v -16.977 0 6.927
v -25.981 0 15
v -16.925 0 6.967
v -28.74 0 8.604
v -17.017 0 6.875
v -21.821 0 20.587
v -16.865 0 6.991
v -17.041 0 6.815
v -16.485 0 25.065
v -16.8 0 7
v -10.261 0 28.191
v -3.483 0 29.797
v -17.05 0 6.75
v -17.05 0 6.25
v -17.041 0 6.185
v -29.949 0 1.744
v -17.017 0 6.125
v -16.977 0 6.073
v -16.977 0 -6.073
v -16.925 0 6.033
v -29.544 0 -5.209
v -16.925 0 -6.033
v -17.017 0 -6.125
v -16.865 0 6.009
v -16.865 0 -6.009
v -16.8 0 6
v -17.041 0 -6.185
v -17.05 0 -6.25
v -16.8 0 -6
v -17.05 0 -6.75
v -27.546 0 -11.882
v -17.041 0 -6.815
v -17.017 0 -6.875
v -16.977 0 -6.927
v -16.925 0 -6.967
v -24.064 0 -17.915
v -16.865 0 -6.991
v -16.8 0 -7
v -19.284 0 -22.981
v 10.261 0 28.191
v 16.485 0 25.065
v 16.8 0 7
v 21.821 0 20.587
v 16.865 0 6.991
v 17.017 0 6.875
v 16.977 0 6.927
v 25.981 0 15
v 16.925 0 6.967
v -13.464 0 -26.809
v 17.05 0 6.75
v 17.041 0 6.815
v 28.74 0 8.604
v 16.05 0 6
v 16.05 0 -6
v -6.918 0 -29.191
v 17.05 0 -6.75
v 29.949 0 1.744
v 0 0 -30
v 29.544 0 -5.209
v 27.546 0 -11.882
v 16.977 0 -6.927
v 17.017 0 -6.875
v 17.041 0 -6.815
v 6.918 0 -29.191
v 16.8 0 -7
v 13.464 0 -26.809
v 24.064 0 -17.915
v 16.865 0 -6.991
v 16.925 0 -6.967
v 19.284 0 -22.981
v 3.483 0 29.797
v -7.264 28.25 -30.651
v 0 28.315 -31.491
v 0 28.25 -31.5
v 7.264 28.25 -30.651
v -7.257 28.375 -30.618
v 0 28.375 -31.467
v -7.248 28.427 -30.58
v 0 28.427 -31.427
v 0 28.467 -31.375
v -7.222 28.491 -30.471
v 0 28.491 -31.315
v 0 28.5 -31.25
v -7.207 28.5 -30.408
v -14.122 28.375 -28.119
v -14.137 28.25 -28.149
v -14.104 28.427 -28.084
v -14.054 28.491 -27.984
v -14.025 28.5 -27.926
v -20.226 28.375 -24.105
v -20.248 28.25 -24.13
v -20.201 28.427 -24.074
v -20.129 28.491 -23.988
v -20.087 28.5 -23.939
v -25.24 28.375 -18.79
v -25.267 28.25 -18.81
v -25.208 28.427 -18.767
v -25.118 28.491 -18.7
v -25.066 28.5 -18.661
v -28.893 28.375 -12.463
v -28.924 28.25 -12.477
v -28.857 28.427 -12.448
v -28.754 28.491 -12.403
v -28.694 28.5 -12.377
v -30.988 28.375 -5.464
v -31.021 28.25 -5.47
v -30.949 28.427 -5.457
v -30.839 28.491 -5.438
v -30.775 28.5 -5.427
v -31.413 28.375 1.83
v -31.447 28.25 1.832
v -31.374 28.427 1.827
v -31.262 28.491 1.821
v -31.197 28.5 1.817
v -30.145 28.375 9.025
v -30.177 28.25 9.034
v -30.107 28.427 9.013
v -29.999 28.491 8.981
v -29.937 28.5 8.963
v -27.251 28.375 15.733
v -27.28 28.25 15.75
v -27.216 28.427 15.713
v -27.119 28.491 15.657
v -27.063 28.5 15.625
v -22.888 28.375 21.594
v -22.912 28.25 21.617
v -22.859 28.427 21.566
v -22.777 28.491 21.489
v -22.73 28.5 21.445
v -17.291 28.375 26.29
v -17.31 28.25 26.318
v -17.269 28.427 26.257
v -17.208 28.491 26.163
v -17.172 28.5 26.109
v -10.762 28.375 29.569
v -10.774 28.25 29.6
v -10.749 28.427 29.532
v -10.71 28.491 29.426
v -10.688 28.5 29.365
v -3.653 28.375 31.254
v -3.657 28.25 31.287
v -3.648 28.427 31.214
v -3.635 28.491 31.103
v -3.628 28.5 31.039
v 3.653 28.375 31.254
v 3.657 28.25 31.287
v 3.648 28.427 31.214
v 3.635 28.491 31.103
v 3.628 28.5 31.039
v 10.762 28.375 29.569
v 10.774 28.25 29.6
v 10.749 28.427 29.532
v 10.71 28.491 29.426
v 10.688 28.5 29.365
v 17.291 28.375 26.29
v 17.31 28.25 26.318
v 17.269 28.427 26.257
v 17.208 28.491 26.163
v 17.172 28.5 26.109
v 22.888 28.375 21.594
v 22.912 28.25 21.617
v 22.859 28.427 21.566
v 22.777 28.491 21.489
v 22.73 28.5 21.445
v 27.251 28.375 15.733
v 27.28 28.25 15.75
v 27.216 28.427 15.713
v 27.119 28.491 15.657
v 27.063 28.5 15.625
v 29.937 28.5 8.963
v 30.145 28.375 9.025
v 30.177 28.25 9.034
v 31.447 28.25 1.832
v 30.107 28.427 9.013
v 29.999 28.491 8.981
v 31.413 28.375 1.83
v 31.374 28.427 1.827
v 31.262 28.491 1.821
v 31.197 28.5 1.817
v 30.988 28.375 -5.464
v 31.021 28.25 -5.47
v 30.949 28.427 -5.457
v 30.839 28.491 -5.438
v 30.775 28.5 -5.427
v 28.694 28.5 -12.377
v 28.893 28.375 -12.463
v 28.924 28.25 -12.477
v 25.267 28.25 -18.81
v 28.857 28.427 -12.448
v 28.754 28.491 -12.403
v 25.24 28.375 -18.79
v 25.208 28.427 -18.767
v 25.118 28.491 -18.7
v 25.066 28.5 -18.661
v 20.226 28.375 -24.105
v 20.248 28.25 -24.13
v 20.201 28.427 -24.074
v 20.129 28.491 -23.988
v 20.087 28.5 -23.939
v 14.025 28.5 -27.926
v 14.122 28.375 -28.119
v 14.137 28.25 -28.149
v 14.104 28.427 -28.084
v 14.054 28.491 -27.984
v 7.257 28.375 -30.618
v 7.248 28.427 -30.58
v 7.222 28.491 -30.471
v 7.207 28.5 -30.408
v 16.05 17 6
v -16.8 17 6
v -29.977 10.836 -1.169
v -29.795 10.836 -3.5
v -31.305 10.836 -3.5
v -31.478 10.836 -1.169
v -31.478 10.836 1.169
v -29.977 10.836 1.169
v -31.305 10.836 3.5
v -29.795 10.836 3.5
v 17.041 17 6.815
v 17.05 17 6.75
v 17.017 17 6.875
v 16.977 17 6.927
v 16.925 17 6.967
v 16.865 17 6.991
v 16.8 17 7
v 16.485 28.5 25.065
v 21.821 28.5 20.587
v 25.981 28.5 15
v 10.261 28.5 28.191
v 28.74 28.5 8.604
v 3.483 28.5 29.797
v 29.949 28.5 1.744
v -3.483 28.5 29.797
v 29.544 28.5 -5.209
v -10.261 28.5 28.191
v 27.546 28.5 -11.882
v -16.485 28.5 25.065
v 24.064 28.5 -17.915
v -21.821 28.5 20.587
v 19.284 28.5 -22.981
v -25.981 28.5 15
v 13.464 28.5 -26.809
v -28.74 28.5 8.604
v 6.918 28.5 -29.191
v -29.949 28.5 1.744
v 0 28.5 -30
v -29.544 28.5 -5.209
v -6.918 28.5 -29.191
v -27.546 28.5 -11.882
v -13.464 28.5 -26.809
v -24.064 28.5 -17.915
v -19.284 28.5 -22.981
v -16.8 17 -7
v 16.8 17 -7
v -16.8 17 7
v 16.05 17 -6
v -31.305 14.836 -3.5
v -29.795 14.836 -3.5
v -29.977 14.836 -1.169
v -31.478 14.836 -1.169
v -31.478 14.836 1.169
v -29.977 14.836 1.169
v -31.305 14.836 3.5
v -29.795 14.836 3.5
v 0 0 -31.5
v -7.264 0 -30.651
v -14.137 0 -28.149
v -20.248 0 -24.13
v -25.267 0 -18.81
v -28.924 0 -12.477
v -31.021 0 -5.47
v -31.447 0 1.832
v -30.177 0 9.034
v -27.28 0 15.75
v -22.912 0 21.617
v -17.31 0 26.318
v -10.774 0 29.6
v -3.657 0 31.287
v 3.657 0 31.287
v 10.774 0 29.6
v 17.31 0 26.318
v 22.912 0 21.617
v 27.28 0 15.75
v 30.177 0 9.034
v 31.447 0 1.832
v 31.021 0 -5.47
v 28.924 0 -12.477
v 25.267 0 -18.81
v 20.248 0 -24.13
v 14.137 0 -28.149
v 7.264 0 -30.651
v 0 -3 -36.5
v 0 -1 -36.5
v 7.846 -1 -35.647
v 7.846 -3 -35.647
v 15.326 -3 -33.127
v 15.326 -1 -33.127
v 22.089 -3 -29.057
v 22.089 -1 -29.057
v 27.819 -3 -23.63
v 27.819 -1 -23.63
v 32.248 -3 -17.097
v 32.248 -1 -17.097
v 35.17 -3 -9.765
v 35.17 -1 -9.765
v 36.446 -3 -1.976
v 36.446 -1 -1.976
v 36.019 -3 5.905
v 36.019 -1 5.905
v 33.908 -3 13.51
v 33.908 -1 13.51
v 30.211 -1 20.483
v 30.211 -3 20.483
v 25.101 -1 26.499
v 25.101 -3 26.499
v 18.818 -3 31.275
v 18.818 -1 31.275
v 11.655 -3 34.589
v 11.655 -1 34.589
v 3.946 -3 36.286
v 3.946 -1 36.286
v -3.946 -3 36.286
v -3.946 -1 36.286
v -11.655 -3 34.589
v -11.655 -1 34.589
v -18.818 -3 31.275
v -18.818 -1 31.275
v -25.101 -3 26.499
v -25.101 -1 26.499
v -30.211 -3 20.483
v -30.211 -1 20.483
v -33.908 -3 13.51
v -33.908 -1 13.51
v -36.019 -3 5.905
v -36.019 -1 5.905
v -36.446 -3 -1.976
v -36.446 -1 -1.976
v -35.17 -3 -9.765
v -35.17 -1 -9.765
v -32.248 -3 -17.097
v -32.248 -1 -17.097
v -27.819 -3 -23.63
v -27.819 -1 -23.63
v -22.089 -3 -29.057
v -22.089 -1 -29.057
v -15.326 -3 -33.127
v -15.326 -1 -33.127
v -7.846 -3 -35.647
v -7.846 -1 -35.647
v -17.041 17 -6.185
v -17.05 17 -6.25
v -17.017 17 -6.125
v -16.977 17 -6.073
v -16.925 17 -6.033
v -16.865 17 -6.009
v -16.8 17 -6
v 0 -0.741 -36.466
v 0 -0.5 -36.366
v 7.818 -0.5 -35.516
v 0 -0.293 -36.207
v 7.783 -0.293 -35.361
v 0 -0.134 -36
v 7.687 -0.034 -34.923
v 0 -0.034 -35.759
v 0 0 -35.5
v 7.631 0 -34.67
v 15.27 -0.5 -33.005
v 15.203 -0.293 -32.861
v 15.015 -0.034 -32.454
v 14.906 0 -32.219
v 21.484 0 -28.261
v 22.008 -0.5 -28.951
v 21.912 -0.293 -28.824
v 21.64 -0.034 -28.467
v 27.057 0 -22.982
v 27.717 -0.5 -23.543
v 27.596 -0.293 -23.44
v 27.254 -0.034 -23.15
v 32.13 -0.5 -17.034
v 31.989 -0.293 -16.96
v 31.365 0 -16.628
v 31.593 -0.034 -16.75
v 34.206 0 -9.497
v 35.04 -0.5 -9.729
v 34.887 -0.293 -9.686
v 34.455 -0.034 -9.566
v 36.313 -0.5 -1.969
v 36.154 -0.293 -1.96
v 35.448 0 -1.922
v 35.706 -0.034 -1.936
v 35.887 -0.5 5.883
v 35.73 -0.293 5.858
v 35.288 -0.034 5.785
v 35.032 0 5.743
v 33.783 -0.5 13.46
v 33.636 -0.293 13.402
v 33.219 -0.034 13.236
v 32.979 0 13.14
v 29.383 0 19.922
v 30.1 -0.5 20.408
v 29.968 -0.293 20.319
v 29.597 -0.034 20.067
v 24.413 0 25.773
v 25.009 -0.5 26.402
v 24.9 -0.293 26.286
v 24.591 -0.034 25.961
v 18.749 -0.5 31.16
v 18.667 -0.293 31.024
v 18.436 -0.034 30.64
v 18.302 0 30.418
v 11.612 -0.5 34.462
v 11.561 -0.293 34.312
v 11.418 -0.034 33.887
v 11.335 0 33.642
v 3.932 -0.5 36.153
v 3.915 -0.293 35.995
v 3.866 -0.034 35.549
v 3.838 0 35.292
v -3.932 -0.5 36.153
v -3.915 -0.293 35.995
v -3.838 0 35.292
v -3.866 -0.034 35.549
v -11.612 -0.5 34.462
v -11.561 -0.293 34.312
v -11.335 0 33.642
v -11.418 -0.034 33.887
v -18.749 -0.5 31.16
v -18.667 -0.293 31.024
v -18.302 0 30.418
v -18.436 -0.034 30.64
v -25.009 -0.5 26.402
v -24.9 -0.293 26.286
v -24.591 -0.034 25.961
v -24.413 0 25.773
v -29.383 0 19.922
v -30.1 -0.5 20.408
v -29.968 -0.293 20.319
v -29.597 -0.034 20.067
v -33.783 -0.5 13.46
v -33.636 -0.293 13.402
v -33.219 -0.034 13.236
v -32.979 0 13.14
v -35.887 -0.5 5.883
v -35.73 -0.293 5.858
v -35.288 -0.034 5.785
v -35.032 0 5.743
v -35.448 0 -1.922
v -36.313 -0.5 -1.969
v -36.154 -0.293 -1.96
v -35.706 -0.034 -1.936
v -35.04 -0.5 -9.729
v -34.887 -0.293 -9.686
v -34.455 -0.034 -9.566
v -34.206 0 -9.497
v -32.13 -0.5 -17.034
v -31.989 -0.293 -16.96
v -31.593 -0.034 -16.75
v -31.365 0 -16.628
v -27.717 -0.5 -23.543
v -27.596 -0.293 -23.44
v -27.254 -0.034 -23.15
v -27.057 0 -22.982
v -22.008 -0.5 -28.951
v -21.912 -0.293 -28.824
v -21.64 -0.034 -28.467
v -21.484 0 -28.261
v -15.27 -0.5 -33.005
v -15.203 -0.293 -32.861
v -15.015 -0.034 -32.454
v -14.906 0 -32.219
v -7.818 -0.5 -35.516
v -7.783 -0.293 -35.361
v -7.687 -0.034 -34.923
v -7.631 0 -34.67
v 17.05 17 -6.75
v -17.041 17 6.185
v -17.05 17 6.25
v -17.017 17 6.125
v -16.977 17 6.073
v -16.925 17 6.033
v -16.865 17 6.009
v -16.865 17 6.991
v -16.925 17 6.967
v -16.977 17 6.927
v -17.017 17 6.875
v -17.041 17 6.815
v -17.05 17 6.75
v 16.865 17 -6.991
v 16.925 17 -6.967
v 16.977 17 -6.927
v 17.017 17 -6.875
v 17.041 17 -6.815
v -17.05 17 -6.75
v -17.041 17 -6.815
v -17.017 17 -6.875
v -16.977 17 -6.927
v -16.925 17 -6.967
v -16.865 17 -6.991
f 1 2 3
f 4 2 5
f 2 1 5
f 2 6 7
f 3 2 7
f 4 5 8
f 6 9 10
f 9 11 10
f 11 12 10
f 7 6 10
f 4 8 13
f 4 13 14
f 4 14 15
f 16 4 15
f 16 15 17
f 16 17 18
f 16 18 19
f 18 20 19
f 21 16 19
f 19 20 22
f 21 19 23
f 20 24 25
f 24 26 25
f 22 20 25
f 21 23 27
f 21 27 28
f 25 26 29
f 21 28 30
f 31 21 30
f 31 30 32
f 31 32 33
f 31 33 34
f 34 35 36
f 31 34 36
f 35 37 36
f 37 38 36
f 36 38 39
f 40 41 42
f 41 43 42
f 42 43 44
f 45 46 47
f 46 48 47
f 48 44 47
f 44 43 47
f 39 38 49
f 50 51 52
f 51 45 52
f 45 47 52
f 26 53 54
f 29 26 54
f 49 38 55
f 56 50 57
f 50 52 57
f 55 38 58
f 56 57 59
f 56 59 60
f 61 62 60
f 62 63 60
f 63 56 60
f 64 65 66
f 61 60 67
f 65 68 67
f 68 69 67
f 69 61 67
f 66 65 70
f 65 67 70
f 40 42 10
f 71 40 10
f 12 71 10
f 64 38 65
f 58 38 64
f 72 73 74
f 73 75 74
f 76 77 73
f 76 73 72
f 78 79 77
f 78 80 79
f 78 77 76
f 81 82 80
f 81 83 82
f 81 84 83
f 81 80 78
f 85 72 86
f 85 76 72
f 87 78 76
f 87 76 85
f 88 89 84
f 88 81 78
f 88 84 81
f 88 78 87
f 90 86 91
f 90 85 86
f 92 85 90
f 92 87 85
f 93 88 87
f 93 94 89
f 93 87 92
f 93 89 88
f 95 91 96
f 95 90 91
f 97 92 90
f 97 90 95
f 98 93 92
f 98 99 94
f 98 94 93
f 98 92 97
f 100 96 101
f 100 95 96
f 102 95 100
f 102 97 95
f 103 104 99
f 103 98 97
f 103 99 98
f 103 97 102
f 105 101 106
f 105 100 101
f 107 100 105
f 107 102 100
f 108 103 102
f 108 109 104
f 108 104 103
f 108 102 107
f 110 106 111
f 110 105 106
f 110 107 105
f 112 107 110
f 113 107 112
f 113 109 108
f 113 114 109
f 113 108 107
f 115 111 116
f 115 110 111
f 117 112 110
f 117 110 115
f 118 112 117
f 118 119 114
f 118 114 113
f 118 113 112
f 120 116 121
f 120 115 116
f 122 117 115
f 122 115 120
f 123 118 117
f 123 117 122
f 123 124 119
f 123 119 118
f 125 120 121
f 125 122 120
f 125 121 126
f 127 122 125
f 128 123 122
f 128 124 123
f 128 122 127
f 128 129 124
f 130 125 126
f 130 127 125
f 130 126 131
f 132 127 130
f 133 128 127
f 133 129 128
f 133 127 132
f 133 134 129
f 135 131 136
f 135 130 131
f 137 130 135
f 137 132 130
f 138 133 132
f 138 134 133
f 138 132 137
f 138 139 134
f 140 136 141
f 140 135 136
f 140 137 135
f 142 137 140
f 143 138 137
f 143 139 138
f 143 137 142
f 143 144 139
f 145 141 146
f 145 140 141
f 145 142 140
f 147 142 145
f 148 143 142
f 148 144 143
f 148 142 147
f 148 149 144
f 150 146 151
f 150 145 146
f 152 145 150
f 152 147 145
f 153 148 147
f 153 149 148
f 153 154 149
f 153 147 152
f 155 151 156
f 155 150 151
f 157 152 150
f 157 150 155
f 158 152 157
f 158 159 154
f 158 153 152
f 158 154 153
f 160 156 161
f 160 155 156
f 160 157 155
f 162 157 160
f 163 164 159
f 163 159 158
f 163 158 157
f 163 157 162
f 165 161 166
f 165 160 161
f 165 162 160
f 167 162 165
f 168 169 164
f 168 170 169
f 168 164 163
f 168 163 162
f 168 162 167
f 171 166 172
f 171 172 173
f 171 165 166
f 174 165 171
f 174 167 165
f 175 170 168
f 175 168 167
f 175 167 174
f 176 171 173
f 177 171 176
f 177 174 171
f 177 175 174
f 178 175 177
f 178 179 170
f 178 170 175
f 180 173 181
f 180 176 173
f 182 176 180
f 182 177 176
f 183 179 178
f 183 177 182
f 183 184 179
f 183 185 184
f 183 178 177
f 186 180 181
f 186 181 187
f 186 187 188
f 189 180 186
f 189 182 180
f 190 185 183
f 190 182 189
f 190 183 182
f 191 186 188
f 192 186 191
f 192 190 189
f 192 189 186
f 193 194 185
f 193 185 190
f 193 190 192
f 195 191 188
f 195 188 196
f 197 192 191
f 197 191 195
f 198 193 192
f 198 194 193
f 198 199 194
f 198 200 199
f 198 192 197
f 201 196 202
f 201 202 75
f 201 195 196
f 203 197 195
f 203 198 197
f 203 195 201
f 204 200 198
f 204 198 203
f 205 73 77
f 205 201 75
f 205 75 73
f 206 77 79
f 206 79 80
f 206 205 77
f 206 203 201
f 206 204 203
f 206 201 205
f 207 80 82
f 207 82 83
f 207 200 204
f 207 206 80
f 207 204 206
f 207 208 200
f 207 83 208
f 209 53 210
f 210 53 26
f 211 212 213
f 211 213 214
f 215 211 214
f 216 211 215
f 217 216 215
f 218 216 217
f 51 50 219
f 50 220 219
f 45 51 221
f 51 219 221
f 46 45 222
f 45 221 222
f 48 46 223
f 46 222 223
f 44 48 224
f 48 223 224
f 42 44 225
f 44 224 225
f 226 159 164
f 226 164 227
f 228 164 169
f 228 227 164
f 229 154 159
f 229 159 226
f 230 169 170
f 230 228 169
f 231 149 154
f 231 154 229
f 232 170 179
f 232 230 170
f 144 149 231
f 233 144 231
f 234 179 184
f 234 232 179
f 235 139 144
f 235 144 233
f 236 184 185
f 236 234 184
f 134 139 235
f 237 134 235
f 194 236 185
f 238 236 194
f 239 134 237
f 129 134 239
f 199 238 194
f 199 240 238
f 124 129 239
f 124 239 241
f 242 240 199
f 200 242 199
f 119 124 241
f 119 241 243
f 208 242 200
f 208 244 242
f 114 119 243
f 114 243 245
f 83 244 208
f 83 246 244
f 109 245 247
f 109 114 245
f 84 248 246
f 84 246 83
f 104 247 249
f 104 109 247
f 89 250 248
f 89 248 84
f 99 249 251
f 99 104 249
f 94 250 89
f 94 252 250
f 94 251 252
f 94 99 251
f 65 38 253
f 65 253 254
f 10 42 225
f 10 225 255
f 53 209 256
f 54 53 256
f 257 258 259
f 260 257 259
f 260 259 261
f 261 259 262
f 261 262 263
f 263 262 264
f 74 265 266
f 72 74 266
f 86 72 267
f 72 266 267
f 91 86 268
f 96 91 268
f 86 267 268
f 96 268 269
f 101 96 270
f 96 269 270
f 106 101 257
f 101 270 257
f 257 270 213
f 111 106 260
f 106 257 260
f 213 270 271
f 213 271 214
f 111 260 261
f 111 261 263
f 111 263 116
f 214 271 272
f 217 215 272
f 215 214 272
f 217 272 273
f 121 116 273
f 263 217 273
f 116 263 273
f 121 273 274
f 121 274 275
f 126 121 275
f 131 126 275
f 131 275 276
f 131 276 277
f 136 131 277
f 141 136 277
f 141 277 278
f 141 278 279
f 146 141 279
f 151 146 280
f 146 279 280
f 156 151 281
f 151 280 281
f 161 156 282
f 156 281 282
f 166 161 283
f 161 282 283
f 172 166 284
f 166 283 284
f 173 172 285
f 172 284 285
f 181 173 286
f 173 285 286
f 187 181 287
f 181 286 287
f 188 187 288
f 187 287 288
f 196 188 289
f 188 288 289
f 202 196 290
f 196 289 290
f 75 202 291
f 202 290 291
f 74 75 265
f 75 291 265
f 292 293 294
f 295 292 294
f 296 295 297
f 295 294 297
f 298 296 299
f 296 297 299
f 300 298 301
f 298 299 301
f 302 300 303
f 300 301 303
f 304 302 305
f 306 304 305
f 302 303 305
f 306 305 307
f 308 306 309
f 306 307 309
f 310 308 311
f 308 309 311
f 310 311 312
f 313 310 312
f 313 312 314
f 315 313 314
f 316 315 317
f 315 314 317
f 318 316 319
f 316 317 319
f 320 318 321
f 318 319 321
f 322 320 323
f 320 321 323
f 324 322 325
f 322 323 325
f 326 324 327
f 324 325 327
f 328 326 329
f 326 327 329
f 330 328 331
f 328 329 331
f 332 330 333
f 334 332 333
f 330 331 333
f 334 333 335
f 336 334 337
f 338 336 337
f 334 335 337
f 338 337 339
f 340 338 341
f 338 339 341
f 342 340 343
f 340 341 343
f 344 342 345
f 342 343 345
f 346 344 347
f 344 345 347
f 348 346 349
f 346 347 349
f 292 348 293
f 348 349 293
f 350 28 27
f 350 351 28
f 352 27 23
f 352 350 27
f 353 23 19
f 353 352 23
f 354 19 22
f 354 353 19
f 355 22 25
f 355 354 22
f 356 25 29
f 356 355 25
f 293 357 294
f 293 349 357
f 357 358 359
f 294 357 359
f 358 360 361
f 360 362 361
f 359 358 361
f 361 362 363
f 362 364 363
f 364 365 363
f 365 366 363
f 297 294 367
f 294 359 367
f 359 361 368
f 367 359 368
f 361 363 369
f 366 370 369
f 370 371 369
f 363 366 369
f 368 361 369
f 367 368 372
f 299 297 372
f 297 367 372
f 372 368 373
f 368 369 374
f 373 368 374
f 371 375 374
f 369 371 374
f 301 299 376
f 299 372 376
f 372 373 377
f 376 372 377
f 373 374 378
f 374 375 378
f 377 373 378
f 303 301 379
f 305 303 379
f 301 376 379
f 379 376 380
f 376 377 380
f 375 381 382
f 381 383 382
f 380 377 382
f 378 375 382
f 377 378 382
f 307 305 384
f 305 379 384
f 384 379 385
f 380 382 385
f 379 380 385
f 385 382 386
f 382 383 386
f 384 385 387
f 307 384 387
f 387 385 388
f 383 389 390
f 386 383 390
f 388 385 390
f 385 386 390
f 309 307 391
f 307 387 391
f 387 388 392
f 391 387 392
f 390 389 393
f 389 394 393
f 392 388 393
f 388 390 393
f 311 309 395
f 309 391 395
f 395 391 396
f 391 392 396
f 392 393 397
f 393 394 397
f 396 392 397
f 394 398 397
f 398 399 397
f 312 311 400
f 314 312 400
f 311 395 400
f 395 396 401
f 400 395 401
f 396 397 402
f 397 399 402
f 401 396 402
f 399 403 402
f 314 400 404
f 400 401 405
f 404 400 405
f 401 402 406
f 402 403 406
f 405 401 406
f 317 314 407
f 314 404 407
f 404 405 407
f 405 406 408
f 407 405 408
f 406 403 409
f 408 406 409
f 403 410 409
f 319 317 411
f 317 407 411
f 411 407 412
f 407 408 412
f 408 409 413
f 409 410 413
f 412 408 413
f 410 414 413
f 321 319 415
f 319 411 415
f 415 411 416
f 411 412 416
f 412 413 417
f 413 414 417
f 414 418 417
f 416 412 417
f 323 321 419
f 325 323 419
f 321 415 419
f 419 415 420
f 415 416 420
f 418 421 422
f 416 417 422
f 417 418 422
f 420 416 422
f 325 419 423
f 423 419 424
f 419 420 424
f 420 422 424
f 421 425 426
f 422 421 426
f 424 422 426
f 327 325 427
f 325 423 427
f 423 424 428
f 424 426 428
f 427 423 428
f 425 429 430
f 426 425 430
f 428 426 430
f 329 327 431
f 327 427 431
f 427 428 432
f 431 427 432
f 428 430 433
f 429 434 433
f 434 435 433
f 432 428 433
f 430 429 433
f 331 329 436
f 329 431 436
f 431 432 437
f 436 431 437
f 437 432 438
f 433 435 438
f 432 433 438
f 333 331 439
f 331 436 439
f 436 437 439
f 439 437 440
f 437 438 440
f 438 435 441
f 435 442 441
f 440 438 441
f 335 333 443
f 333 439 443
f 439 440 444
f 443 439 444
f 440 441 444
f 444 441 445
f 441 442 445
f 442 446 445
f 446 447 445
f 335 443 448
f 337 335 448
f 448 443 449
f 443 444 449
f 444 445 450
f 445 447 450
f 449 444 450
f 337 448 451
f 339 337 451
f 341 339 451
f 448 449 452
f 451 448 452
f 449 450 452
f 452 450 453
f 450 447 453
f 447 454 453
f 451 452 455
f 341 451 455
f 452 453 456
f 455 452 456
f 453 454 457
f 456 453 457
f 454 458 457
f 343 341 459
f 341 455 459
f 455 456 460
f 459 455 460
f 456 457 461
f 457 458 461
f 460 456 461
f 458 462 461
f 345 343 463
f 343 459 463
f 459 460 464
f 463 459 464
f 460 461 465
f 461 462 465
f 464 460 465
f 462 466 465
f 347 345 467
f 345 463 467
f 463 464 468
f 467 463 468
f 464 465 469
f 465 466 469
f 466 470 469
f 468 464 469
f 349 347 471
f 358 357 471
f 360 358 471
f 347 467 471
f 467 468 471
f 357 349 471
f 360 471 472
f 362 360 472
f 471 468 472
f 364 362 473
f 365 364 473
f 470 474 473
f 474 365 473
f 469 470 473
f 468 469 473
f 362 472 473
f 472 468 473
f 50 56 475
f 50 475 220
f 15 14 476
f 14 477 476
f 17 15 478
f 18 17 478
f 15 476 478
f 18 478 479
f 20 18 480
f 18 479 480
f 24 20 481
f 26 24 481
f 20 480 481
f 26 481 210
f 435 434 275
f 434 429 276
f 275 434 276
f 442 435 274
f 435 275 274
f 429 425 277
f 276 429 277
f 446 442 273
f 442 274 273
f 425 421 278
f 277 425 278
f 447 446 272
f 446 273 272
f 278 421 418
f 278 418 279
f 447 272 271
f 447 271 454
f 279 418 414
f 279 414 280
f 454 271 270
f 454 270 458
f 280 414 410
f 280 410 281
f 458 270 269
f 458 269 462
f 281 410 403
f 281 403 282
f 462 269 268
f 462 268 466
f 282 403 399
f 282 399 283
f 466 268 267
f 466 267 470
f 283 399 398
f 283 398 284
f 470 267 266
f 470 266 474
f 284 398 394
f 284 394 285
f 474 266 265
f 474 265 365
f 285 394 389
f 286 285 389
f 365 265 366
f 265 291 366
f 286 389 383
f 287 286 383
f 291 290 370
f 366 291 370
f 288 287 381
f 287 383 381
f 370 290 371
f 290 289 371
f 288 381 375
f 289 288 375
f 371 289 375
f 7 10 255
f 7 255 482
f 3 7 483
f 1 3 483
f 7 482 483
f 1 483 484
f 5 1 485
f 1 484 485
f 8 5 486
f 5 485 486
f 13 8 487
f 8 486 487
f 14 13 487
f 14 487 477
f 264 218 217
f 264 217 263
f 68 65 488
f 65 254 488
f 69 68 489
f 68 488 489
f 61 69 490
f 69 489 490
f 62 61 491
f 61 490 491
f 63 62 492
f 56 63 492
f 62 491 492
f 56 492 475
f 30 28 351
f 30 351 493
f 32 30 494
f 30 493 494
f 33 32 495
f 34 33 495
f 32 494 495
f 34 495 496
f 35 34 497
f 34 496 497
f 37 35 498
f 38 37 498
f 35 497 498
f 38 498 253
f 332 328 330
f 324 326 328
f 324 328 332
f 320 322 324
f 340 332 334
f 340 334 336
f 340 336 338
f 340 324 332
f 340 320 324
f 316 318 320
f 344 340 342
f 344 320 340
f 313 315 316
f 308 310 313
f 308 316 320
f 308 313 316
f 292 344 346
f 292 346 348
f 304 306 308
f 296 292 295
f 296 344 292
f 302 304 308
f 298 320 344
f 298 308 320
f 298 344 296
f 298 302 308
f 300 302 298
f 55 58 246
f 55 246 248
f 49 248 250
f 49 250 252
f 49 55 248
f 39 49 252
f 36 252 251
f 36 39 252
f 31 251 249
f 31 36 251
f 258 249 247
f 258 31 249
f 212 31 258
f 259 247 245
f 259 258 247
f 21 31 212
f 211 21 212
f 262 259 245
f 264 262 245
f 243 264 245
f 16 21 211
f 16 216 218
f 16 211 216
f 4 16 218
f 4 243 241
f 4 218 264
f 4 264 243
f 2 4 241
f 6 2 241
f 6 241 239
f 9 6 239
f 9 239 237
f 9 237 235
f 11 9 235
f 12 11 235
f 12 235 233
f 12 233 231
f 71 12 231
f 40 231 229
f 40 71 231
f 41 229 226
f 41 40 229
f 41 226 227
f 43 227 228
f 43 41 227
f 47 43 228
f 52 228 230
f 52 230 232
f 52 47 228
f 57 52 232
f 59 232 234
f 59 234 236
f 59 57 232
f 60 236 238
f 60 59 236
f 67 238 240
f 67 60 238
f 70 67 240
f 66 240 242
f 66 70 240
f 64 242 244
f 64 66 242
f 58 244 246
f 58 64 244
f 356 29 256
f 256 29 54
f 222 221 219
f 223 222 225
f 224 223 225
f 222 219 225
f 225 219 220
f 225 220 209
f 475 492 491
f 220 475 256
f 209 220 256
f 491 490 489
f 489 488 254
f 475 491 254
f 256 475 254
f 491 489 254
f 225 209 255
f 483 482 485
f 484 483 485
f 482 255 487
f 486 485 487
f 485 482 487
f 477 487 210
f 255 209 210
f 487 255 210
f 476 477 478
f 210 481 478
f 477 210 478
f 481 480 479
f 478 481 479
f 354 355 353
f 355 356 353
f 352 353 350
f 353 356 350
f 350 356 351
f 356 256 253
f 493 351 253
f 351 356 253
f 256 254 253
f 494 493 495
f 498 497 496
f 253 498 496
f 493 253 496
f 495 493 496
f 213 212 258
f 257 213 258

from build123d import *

# Parameters (mm, degrees)
SKETCH1_R           = 31.5
SKETCH1_R_2         = 30
BOSS_EXTRUDE1_DEPTH = 28.5
SKETCH2_R           = 36.5
BOSS_EXTRUDE2_DEPTH = 3
BOSS_EXTRUDE3_DEPTH = 17
SKETCH4_W           = 7
SKETCH4_H           = 4
CUT_EXTRUDE1_DEPTH  = 71.042861878
FILLET1_R           = 1
FILLET2_R           = 0.25
FILLET3_R           = 0.25


with BuildPart() as part:
    # Sketch1 → Boss-Extrude1 (new body)
    with BuildSketch(Plane(origin=(0, 0, 0), x_dir=(1, 0, 0), z_dir=(0, 1, 0))):
        with Locations(Location((0, 0, 0), (0, 0, 90))):
            Circle(SKETCH1_R)
        with Locations(Location((0, 0, 0), (0, 0, 90))):
            Circle(SKETCH1_R_2, mode=Mode.SUBTRACT)
    extrude(amount=BOSS_EXTRUDE1_DEPTH)

    # Sketch2 → Boss-Extrude2 (add)
    with BuildSketch(Plane.XZ):
        with Locations(Location((0, 0, 0), (0, 0, 270))):
            Circle(SKETCH2_R)
    extrude(amount=BOSS_EXTRUDE2_DEPTH)

    # Sketch3 → Boss-Extrude3 (add)
    with BuildSketch(Plane(origin=(0, 0, 0), x_dir=(1, 0, 0), z_dir=(0, 1, 0))):
        Polygon((-16.05, 6), (-17.05, 6), (-17.05, 7), (17.05, 7), (17.05, -7), (-17.05, -7), (-17.05, -6), (-16.05, -6), (16.05, -6), (16.05, 6), align=None)
    extrude(amount=BOSS_EXTRUDE3_DEPTH)

    # Sketch4 → Cut-Extrude1 (cut, through all)
    with BuildSketch(Plane.ZY.offset(-16.05)):
        with Locations((0, 12.835709784)):
            Rectangle(SKETCH4_W, SKETCH4_H)
    extrude(amount=CUT_EXTRUDE1_DEPTH, mode=Mode.SUBTRACT)

    # Fillet1
    fillet1_edges = [part.edges().sort_by_distance(p)[0] for p in [
        (0, 0, 36.5),
    ]]
    fillet(fillet1_edges, radius=FILLET1_R)

    # Fillet2
    fillet2_edges = [part.edges().sort_by_distance(p)[0] for p in [
        (0, 28.5, 31.5),
    ]]
    fillet(fillet2_edges, radius=FILLET2_R)

    # Fillet3
    fillet3_edges = [part.edges().sort_by_distance(p)[0] for p in [
        (-17.05, 8.5, 6),
        (-17.05, 8.5, 7),
        (17.05, 8.5, 7),
        (17.05, 8.5, -7),
        (-17.05, 8.5, -7),
        (-17.05, 8.5, -6),
    ]]
    fillet(fillet3_edges, radius=FILLET3_R)


solid = part.part
